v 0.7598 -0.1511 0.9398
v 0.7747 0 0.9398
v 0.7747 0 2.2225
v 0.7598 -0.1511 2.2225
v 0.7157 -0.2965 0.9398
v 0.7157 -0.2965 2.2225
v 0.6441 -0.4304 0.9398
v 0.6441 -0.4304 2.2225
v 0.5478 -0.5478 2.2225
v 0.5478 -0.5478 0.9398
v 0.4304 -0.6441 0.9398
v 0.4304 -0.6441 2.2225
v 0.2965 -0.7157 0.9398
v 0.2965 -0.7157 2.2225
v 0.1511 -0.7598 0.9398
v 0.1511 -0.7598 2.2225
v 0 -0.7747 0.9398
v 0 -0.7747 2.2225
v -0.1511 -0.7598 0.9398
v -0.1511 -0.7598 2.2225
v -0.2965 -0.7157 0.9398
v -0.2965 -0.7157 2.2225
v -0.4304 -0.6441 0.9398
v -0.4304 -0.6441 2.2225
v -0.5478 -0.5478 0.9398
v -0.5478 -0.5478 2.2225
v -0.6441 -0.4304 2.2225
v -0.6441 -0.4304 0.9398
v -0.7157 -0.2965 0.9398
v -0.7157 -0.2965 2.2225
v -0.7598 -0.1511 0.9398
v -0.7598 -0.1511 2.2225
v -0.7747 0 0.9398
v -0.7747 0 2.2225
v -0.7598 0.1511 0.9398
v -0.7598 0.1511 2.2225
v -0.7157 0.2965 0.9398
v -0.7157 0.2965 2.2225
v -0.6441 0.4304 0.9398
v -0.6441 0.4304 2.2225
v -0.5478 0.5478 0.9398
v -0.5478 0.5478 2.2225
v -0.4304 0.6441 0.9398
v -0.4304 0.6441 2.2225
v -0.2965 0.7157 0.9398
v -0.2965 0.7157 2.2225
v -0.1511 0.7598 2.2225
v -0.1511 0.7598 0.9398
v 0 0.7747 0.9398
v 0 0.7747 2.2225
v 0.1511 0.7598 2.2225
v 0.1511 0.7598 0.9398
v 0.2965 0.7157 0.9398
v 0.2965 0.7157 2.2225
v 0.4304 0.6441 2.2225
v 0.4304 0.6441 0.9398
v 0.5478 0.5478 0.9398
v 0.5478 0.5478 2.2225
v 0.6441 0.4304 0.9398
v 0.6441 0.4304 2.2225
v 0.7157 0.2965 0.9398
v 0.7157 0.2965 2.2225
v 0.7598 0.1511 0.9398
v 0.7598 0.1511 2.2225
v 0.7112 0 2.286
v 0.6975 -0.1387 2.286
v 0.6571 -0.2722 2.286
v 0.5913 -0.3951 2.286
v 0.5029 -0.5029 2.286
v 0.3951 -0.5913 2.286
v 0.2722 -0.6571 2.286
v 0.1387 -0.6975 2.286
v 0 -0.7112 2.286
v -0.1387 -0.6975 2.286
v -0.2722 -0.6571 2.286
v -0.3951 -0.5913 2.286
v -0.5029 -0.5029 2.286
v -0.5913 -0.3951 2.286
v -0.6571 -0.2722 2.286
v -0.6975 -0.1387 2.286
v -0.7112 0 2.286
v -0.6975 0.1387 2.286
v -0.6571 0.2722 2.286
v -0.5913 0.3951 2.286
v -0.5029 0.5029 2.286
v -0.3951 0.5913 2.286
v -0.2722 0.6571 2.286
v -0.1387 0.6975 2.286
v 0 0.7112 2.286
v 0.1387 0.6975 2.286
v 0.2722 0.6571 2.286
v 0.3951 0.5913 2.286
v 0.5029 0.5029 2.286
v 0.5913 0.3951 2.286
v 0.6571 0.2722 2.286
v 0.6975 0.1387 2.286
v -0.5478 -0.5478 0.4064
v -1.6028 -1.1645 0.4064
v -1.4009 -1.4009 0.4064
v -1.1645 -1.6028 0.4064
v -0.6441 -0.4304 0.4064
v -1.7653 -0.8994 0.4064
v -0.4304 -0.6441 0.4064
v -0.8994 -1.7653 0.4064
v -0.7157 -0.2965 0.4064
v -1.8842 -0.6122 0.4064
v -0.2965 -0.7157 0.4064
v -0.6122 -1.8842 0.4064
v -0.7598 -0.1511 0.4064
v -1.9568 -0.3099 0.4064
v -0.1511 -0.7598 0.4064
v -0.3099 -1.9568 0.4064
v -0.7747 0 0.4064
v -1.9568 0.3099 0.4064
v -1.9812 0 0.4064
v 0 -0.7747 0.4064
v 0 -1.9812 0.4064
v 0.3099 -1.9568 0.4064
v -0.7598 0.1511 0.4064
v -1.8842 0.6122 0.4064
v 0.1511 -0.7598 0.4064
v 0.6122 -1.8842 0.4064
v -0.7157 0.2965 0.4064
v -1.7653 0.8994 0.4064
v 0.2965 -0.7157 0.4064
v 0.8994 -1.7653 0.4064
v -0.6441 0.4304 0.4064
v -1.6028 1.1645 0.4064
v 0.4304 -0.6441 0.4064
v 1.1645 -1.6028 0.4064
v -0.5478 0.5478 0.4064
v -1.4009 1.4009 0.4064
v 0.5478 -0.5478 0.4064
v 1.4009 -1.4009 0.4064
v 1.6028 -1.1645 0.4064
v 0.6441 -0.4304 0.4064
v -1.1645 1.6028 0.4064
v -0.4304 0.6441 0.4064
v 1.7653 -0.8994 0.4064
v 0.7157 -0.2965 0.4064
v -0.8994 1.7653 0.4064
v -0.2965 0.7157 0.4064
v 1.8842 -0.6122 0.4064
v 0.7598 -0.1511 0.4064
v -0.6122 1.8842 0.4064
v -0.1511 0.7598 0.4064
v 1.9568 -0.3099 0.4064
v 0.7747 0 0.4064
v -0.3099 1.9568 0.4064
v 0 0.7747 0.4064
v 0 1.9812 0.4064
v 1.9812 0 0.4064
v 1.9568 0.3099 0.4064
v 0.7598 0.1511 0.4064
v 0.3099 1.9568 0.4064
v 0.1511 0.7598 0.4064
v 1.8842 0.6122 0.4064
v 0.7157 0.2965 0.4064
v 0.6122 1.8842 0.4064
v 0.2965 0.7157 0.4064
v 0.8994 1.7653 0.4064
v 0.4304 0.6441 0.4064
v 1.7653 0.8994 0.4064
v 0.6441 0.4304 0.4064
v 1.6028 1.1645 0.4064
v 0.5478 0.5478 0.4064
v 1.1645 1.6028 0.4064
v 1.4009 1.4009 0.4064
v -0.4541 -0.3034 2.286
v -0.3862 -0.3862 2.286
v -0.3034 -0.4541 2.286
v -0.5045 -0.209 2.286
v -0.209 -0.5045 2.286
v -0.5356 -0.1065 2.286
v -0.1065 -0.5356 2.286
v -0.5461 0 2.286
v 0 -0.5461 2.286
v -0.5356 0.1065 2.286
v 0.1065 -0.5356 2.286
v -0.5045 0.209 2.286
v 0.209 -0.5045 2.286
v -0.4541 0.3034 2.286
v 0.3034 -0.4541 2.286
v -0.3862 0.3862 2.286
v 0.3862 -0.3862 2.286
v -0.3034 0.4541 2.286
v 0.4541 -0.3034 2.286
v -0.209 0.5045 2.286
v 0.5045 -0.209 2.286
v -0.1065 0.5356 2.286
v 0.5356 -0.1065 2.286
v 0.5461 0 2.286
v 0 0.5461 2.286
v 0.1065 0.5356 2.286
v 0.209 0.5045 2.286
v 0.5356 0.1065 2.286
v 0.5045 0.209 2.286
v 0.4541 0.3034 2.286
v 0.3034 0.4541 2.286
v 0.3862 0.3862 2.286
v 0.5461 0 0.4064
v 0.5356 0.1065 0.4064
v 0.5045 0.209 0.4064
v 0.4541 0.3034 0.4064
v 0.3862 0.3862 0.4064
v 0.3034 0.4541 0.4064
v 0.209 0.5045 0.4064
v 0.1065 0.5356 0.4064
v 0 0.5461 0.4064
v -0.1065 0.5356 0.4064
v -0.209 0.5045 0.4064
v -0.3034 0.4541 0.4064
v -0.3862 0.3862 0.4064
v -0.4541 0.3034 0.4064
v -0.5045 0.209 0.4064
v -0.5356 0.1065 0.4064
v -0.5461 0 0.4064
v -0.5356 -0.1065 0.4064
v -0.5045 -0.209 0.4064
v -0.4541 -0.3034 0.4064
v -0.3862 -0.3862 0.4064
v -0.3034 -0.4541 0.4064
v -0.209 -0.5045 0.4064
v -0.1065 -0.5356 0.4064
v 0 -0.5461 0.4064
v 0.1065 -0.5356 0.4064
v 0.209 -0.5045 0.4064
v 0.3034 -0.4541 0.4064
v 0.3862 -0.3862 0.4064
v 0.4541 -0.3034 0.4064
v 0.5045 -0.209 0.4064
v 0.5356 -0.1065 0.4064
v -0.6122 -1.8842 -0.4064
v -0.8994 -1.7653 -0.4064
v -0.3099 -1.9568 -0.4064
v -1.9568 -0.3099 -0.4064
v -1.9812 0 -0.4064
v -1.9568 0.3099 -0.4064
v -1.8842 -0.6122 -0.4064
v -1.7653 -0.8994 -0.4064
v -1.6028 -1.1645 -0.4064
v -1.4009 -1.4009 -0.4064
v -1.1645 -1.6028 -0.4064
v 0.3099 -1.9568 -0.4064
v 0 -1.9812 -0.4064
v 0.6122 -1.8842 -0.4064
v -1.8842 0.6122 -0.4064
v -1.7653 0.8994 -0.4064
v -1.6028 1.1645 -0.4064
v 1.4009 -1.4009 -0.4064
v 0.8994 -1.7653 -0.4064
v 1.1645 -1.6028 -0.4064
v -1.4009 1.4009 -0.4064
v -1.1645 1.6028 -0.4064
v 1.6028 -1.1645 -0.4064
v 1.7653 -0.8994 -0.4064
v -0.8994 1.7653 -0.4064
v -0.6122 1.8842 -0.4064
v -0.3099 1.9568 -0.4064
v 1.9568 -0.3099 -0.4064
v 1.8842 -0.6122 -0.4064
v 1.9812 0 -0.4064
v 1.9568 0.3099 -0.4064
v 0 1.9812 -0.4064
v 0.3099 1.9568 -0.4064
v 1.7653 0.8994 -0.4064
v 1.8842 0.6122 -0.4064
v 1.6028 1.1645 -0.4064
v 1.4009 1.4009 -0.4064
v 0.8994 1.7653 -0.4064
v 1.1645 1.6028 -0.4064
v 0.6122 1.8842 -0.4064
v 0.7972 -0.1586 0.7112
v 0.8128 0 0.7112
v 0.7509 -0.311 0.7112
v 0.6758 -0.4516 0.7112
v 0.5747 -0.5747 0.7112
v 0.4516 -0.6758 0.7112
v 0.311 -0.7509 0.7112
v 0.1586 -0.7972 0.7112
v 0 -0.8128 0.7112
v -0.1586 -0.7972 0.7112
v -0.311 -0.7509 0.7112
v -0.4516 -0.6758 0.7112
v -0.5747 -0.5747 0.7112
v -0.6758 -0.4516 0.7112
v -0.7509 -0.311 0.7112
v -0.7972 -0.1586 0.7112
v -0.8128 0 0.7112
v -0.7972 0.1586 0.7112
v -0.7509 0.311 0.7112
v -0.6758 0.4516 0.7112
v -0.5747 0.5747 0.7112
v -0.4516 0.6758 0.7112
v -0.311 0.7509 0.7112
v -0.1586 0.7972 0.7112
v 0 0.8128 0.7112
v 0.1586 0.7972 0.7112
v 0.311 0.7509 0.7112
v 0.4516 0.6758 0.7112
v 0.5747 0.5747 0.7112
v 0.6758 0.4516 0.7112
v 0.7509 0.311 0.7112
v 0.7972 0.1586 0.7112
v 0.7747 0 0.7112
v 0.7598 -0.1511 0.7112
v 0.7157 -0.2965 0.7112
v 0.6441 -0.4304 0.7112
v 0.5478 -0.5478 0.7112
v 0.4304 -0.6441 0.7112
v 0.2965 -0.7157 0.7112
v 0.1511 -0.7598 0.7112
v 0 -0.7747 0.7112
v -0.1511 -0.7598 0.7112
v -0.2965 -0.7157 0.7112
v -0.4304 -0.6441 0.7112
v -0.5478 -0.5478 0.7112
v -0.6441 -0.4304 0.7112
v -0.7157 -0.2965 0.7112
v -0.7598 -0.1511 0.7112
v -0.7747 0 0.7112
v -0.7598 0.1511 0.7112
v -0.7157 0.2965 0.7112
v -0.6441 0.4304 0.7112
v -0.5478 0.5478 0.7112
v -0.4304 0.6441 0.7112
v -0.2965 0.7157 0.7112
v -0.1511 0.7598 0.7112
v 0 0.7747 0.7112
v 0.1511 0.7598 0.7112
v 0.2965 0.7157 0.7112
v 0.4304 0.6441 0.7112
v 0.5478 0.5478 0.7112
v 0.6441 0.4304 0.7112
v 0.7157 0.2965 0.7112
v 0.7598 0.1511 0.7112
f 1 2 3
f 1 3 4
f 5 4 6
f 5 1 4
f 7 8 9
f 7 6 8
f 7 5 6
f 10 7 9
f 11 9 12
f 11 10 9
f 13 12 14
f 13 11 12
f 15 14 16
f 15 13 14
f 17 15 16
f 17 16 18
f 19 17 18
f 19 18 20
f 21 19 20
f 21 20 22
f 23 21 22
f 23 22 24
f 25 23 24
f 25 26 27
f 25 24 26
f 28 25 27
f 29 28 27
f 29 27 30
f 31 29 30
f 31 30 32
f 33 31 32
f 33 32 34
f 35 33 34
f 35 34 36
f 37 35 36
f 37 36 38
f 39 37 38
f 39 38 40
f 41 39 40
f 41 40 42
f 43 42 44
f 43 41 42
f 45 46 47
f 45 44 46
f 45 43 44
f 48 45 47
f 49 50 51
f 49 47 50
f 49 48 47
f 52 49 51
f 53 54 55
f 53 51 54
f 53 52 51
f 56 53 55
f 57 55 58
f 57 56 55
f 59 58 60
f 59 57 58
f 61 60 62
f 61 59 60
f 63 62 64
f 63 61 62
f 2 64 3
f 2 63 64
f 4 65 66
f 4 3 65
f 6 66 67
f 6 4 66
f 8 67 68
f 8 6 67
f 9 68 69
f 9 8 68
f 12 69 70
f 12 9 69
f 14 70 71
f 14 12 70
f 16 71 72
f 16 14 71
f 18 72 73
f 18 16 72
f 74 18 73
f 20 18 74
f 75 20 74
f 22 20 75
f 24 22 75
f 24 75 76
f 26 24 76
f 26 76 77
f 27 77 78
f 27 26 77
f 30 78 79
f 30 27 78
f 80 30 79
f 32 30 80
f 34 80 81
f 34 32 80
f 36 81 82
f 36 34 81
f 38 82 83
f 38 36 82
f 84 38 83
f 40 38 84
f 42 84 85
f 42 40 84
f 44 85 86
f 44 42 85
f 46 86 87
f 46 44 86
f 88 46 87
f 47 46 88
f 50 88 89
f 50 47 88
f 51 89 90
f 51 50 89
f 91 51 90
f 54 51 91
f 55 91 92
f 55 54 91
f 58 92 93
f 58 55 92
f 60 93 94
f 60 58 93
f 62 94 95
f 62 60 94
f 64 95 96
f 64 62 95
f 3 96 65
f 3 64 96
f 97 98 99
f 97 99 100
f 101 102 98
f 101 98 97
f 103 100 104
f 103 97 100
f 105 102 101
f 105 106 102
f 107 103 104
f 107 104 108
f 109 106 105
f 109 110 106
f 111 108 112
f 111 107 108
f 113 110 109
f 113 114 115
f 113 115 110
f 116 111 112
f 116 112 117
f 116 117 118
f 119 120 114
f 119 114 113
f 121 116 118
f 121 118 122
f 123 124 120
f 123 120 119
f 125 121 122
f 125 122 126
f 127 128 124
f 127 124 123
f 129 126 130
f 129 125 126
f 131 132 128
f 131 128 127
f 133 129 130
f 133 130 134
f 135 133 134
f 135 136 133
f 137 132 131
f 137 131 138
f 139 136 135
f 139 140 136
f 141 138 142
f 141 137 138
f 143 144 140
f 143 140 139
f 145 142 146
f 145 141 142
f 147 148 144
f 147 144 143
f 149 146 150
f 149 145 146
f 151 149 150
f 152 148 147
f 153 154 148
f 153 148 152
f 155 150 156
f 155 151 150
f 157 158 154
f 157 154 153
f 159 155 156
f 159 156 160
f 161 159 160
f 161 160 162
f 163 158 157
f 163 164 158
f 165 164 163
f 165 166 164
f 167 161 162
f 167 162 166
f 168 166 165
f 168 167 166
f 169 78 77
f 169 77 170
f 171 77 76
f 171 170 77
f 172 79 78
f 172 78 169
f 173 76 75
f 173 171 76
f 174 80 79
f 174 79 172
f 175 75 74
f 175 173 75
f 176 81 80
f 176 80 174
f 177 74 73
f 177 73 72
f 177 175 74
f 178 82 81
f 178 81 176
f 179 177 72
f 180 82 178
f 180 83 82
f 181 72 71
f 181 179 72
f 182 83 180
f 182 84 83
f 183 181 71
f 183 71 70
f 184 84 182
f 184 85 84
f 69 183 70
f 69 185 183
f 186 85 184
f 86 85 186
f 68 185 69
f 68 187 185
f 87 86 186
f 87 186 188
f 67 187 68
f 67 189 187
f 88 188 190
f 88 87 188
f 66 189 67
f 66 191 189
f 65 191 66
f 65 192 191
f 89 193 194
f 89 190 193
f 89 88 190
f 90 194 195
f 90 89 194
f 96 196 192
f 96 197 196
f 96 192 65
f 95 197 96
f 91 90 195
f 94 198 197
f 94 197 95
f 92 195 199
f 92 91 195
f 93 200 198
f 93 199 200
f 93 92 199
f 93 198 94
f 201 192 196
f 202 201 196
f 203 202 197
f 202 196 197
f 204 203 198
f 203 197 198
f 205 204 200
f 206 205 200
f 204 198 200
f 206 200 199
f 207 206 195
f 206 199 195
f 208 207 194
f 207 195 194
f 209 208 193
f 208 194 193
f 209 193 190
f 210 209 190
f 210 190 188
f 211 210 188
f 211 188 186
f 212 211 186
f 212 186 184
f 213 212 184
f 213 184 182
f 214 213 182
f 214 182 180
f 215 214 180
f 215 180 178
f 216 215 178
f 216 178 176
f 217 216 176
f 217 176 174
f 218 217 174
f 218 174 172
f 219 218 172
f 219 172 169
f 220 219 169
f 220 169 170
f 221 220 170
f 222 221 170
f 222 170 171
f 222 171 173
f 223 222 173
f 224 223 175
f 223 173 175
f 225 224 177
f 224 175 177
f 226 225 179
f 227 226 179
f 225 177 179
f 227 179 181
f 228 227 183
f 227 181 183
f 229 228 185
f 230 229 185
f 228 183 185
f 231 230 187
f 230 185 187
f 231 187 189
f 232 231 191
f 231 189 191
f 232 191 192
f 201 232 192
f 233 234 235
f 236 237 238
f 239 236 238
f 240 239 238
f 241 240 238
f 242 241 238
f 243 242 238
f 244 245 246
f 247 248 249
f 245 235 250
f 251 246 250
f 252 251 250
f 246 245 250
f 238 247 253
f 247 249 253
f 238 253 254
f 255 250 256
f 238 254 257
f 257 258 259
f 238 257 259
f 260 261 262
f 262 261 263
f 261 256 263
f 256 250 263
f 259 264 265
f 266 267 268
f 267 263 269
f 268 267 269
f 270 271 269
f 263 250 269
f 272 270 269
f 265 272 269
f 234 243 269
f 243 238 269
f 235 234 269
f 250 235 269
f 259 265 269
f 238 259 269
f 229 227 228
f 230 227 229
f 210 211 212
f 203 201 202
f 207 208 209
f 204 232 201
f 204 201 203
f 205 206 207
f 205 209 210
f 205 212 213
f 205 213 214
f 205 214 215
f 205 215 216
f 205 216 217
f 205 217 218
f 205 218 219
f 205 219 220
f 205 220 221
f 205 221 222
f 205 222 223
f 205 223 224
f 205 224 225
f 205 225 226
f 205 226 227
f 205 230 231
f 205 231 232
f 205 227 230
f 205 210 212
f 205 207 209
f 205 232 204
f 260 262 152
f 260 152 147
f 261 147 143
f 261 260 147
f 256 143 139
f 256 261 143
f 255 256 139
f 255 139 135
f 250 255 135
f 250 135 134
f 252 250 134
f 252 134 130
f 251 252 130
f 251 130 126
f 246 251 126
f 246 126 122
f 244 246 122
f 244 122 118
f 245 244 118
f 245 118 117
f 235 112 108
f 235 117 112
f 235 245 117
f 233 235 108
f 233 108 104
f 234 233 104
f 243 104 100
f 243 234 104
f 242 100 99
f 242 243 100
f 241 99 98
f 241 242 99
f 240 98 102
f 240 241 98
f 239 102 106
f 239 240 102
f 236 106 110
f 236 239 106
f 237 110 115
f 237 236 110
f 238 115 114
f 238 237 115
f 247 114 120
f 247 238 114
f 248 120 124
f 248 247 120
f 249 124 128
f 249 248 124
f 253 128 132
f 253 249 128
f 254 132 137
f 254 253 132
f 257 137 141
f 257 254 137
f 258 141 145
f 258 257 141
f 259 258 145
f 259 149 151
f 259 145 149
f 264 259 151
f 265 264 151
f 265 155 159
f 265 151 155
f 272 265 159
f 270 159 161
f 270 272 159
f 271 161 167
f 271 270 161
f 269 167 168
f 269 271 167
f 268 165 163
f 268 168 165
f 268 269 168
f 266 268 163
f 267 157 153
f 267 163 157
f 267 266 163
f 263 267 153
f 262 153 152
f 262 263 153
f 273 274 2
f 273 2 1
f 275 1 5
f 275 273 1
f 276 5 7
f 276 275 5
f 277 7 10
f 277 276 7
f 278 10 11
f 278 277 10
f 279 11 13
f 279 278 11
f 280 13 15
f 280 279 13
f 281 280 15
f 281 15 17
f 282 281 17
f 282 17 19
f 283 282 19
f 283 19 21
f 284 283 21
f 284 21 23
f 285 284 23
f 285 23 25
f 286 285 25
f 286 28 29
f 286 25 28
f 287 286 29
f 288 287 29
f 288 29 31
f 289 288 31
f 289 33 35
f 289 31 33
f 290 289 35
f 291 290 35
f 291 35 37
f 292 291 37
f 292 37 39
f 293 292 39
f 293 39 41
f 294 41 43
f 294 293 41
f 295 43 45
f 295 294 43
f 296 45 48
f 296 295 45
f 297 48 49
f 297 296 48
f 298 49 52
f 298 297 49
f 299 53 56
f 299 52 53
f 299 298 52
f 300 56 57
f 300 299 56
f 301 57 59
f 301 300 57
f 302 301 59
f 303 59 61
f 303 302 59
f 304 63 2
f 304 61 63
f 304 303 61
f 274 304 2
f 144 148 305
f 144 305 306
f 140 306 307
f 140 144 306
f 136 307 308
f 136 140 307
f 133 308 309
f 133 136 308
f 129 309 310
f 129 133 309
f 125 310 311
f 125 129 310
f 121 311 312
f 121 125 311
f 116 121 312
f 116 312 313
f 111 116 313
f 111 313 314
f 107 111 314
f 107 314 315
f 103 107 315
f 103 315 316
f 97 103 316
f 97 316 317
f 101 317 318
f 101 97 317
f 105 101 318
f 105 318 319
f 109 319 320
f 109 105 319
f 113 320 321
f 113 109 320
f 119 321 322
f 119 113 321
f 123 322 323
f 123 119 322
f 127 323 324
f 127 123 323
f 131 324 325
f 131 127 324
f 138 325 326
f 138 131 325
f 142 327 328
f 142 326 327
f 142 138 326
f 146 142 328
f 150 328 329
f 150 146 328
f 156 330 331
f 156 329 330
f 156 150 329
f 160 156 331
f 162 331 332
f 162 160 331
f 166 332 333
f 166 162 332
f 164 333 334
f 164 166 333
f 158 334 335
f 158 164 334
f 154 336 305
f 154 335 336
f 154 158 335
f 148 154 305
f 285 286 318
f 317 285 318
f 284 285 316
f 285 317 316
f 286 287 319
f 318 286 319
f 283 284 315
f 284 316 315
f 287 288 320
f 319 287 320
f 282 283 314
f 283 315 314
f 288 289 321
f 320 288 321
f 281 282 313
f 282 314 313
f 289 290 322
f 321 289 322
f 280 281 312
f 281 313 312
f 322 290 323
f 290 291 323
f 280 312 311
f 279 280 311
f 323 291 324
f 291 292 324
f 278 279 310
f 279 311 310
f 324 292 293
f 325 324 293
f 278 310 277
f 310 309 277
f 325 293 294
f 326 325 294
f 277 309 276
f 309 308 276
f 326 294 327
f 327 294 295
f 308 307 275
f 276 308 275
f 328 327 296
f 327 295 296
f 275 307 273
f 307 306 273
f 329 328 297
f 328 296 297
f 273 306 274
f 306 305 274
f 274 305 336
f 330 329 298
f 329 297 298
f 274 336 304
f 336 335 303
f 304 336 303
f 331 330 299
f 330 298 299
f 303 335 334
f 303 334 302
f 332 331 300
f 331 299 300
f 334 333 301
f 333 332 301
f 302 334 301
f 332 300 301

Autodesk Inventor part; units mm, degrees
ref_plane "YZ Plane" through (0, 0, 0) normal (1, 0, 0) x (0, 1, 0)
ref_plane "XZ Plane" through (0, 0, 0) normal (0, 1, 0) x (-1, 0, 0)
ref_plane "XY Plane" through (0, 0, 0) normal (0, 0, 1) x (1, 0, 0)
sketch "Sketch1" plane through (0, 0, 0) normal (0, 1, 0) x (-1, 0, 0)
  line L0 (0, -0.4064) -> (0, 0.4064)
  line L1 (0, 0.4064) -> (-0.5461, 0.4064)
  line L2 (-0.5461, 0.4064) -> (-0.5461, 2.286)
  line L3 (-0.5461, 2.286) -> (-0.7112, 2.286)
  line L4 (-0.7112, 2.286) -> (-0.7747, 2.2225)
  line L5 (-0.7747, 2.2225) -> (-0.7747, 0.9398)
  line L6 (-0.7747, 0.9398) -> (-0.8128, 0.7112)
  line L7 (-0.8128, 0.7112) -> (-0.7747, 0.7112)
  line L8 (-0.7747, 0.7112) -> (-0.7747, 0.4064)
  line L9 (-0.7747, 0.4064) -> (-1.9812, 0.4064)
  line L10 (-1.9812, 0.4064) -> (-1.9812, -0.4064)
  line L11 (-1.9812, -0.4064) -> (0, -0.4064)
  point P0 (0, 0)
  point P1 (0, 0)
  dimension "d0" = 3.9624
  dimension "d1" = 0.8128
  dimension "d2" = 1.5494
  dimension "d3" = 1.6256
  dimension "d4" = 1.0922
  dimension "d5" = 1.4224
  dimension "d6" = 45
  dimension "d7" = 2.6924
  dimension "d8" = 1.1176
  dimension "d9" = 1.3462
revolve "Revolution1" add sketch "Sketch1" angle 360 about axis through (0, 0, -0.4064) along (0, 0, 1)
properties part number "Base" material "Nickel-Copper Alloy 400"
